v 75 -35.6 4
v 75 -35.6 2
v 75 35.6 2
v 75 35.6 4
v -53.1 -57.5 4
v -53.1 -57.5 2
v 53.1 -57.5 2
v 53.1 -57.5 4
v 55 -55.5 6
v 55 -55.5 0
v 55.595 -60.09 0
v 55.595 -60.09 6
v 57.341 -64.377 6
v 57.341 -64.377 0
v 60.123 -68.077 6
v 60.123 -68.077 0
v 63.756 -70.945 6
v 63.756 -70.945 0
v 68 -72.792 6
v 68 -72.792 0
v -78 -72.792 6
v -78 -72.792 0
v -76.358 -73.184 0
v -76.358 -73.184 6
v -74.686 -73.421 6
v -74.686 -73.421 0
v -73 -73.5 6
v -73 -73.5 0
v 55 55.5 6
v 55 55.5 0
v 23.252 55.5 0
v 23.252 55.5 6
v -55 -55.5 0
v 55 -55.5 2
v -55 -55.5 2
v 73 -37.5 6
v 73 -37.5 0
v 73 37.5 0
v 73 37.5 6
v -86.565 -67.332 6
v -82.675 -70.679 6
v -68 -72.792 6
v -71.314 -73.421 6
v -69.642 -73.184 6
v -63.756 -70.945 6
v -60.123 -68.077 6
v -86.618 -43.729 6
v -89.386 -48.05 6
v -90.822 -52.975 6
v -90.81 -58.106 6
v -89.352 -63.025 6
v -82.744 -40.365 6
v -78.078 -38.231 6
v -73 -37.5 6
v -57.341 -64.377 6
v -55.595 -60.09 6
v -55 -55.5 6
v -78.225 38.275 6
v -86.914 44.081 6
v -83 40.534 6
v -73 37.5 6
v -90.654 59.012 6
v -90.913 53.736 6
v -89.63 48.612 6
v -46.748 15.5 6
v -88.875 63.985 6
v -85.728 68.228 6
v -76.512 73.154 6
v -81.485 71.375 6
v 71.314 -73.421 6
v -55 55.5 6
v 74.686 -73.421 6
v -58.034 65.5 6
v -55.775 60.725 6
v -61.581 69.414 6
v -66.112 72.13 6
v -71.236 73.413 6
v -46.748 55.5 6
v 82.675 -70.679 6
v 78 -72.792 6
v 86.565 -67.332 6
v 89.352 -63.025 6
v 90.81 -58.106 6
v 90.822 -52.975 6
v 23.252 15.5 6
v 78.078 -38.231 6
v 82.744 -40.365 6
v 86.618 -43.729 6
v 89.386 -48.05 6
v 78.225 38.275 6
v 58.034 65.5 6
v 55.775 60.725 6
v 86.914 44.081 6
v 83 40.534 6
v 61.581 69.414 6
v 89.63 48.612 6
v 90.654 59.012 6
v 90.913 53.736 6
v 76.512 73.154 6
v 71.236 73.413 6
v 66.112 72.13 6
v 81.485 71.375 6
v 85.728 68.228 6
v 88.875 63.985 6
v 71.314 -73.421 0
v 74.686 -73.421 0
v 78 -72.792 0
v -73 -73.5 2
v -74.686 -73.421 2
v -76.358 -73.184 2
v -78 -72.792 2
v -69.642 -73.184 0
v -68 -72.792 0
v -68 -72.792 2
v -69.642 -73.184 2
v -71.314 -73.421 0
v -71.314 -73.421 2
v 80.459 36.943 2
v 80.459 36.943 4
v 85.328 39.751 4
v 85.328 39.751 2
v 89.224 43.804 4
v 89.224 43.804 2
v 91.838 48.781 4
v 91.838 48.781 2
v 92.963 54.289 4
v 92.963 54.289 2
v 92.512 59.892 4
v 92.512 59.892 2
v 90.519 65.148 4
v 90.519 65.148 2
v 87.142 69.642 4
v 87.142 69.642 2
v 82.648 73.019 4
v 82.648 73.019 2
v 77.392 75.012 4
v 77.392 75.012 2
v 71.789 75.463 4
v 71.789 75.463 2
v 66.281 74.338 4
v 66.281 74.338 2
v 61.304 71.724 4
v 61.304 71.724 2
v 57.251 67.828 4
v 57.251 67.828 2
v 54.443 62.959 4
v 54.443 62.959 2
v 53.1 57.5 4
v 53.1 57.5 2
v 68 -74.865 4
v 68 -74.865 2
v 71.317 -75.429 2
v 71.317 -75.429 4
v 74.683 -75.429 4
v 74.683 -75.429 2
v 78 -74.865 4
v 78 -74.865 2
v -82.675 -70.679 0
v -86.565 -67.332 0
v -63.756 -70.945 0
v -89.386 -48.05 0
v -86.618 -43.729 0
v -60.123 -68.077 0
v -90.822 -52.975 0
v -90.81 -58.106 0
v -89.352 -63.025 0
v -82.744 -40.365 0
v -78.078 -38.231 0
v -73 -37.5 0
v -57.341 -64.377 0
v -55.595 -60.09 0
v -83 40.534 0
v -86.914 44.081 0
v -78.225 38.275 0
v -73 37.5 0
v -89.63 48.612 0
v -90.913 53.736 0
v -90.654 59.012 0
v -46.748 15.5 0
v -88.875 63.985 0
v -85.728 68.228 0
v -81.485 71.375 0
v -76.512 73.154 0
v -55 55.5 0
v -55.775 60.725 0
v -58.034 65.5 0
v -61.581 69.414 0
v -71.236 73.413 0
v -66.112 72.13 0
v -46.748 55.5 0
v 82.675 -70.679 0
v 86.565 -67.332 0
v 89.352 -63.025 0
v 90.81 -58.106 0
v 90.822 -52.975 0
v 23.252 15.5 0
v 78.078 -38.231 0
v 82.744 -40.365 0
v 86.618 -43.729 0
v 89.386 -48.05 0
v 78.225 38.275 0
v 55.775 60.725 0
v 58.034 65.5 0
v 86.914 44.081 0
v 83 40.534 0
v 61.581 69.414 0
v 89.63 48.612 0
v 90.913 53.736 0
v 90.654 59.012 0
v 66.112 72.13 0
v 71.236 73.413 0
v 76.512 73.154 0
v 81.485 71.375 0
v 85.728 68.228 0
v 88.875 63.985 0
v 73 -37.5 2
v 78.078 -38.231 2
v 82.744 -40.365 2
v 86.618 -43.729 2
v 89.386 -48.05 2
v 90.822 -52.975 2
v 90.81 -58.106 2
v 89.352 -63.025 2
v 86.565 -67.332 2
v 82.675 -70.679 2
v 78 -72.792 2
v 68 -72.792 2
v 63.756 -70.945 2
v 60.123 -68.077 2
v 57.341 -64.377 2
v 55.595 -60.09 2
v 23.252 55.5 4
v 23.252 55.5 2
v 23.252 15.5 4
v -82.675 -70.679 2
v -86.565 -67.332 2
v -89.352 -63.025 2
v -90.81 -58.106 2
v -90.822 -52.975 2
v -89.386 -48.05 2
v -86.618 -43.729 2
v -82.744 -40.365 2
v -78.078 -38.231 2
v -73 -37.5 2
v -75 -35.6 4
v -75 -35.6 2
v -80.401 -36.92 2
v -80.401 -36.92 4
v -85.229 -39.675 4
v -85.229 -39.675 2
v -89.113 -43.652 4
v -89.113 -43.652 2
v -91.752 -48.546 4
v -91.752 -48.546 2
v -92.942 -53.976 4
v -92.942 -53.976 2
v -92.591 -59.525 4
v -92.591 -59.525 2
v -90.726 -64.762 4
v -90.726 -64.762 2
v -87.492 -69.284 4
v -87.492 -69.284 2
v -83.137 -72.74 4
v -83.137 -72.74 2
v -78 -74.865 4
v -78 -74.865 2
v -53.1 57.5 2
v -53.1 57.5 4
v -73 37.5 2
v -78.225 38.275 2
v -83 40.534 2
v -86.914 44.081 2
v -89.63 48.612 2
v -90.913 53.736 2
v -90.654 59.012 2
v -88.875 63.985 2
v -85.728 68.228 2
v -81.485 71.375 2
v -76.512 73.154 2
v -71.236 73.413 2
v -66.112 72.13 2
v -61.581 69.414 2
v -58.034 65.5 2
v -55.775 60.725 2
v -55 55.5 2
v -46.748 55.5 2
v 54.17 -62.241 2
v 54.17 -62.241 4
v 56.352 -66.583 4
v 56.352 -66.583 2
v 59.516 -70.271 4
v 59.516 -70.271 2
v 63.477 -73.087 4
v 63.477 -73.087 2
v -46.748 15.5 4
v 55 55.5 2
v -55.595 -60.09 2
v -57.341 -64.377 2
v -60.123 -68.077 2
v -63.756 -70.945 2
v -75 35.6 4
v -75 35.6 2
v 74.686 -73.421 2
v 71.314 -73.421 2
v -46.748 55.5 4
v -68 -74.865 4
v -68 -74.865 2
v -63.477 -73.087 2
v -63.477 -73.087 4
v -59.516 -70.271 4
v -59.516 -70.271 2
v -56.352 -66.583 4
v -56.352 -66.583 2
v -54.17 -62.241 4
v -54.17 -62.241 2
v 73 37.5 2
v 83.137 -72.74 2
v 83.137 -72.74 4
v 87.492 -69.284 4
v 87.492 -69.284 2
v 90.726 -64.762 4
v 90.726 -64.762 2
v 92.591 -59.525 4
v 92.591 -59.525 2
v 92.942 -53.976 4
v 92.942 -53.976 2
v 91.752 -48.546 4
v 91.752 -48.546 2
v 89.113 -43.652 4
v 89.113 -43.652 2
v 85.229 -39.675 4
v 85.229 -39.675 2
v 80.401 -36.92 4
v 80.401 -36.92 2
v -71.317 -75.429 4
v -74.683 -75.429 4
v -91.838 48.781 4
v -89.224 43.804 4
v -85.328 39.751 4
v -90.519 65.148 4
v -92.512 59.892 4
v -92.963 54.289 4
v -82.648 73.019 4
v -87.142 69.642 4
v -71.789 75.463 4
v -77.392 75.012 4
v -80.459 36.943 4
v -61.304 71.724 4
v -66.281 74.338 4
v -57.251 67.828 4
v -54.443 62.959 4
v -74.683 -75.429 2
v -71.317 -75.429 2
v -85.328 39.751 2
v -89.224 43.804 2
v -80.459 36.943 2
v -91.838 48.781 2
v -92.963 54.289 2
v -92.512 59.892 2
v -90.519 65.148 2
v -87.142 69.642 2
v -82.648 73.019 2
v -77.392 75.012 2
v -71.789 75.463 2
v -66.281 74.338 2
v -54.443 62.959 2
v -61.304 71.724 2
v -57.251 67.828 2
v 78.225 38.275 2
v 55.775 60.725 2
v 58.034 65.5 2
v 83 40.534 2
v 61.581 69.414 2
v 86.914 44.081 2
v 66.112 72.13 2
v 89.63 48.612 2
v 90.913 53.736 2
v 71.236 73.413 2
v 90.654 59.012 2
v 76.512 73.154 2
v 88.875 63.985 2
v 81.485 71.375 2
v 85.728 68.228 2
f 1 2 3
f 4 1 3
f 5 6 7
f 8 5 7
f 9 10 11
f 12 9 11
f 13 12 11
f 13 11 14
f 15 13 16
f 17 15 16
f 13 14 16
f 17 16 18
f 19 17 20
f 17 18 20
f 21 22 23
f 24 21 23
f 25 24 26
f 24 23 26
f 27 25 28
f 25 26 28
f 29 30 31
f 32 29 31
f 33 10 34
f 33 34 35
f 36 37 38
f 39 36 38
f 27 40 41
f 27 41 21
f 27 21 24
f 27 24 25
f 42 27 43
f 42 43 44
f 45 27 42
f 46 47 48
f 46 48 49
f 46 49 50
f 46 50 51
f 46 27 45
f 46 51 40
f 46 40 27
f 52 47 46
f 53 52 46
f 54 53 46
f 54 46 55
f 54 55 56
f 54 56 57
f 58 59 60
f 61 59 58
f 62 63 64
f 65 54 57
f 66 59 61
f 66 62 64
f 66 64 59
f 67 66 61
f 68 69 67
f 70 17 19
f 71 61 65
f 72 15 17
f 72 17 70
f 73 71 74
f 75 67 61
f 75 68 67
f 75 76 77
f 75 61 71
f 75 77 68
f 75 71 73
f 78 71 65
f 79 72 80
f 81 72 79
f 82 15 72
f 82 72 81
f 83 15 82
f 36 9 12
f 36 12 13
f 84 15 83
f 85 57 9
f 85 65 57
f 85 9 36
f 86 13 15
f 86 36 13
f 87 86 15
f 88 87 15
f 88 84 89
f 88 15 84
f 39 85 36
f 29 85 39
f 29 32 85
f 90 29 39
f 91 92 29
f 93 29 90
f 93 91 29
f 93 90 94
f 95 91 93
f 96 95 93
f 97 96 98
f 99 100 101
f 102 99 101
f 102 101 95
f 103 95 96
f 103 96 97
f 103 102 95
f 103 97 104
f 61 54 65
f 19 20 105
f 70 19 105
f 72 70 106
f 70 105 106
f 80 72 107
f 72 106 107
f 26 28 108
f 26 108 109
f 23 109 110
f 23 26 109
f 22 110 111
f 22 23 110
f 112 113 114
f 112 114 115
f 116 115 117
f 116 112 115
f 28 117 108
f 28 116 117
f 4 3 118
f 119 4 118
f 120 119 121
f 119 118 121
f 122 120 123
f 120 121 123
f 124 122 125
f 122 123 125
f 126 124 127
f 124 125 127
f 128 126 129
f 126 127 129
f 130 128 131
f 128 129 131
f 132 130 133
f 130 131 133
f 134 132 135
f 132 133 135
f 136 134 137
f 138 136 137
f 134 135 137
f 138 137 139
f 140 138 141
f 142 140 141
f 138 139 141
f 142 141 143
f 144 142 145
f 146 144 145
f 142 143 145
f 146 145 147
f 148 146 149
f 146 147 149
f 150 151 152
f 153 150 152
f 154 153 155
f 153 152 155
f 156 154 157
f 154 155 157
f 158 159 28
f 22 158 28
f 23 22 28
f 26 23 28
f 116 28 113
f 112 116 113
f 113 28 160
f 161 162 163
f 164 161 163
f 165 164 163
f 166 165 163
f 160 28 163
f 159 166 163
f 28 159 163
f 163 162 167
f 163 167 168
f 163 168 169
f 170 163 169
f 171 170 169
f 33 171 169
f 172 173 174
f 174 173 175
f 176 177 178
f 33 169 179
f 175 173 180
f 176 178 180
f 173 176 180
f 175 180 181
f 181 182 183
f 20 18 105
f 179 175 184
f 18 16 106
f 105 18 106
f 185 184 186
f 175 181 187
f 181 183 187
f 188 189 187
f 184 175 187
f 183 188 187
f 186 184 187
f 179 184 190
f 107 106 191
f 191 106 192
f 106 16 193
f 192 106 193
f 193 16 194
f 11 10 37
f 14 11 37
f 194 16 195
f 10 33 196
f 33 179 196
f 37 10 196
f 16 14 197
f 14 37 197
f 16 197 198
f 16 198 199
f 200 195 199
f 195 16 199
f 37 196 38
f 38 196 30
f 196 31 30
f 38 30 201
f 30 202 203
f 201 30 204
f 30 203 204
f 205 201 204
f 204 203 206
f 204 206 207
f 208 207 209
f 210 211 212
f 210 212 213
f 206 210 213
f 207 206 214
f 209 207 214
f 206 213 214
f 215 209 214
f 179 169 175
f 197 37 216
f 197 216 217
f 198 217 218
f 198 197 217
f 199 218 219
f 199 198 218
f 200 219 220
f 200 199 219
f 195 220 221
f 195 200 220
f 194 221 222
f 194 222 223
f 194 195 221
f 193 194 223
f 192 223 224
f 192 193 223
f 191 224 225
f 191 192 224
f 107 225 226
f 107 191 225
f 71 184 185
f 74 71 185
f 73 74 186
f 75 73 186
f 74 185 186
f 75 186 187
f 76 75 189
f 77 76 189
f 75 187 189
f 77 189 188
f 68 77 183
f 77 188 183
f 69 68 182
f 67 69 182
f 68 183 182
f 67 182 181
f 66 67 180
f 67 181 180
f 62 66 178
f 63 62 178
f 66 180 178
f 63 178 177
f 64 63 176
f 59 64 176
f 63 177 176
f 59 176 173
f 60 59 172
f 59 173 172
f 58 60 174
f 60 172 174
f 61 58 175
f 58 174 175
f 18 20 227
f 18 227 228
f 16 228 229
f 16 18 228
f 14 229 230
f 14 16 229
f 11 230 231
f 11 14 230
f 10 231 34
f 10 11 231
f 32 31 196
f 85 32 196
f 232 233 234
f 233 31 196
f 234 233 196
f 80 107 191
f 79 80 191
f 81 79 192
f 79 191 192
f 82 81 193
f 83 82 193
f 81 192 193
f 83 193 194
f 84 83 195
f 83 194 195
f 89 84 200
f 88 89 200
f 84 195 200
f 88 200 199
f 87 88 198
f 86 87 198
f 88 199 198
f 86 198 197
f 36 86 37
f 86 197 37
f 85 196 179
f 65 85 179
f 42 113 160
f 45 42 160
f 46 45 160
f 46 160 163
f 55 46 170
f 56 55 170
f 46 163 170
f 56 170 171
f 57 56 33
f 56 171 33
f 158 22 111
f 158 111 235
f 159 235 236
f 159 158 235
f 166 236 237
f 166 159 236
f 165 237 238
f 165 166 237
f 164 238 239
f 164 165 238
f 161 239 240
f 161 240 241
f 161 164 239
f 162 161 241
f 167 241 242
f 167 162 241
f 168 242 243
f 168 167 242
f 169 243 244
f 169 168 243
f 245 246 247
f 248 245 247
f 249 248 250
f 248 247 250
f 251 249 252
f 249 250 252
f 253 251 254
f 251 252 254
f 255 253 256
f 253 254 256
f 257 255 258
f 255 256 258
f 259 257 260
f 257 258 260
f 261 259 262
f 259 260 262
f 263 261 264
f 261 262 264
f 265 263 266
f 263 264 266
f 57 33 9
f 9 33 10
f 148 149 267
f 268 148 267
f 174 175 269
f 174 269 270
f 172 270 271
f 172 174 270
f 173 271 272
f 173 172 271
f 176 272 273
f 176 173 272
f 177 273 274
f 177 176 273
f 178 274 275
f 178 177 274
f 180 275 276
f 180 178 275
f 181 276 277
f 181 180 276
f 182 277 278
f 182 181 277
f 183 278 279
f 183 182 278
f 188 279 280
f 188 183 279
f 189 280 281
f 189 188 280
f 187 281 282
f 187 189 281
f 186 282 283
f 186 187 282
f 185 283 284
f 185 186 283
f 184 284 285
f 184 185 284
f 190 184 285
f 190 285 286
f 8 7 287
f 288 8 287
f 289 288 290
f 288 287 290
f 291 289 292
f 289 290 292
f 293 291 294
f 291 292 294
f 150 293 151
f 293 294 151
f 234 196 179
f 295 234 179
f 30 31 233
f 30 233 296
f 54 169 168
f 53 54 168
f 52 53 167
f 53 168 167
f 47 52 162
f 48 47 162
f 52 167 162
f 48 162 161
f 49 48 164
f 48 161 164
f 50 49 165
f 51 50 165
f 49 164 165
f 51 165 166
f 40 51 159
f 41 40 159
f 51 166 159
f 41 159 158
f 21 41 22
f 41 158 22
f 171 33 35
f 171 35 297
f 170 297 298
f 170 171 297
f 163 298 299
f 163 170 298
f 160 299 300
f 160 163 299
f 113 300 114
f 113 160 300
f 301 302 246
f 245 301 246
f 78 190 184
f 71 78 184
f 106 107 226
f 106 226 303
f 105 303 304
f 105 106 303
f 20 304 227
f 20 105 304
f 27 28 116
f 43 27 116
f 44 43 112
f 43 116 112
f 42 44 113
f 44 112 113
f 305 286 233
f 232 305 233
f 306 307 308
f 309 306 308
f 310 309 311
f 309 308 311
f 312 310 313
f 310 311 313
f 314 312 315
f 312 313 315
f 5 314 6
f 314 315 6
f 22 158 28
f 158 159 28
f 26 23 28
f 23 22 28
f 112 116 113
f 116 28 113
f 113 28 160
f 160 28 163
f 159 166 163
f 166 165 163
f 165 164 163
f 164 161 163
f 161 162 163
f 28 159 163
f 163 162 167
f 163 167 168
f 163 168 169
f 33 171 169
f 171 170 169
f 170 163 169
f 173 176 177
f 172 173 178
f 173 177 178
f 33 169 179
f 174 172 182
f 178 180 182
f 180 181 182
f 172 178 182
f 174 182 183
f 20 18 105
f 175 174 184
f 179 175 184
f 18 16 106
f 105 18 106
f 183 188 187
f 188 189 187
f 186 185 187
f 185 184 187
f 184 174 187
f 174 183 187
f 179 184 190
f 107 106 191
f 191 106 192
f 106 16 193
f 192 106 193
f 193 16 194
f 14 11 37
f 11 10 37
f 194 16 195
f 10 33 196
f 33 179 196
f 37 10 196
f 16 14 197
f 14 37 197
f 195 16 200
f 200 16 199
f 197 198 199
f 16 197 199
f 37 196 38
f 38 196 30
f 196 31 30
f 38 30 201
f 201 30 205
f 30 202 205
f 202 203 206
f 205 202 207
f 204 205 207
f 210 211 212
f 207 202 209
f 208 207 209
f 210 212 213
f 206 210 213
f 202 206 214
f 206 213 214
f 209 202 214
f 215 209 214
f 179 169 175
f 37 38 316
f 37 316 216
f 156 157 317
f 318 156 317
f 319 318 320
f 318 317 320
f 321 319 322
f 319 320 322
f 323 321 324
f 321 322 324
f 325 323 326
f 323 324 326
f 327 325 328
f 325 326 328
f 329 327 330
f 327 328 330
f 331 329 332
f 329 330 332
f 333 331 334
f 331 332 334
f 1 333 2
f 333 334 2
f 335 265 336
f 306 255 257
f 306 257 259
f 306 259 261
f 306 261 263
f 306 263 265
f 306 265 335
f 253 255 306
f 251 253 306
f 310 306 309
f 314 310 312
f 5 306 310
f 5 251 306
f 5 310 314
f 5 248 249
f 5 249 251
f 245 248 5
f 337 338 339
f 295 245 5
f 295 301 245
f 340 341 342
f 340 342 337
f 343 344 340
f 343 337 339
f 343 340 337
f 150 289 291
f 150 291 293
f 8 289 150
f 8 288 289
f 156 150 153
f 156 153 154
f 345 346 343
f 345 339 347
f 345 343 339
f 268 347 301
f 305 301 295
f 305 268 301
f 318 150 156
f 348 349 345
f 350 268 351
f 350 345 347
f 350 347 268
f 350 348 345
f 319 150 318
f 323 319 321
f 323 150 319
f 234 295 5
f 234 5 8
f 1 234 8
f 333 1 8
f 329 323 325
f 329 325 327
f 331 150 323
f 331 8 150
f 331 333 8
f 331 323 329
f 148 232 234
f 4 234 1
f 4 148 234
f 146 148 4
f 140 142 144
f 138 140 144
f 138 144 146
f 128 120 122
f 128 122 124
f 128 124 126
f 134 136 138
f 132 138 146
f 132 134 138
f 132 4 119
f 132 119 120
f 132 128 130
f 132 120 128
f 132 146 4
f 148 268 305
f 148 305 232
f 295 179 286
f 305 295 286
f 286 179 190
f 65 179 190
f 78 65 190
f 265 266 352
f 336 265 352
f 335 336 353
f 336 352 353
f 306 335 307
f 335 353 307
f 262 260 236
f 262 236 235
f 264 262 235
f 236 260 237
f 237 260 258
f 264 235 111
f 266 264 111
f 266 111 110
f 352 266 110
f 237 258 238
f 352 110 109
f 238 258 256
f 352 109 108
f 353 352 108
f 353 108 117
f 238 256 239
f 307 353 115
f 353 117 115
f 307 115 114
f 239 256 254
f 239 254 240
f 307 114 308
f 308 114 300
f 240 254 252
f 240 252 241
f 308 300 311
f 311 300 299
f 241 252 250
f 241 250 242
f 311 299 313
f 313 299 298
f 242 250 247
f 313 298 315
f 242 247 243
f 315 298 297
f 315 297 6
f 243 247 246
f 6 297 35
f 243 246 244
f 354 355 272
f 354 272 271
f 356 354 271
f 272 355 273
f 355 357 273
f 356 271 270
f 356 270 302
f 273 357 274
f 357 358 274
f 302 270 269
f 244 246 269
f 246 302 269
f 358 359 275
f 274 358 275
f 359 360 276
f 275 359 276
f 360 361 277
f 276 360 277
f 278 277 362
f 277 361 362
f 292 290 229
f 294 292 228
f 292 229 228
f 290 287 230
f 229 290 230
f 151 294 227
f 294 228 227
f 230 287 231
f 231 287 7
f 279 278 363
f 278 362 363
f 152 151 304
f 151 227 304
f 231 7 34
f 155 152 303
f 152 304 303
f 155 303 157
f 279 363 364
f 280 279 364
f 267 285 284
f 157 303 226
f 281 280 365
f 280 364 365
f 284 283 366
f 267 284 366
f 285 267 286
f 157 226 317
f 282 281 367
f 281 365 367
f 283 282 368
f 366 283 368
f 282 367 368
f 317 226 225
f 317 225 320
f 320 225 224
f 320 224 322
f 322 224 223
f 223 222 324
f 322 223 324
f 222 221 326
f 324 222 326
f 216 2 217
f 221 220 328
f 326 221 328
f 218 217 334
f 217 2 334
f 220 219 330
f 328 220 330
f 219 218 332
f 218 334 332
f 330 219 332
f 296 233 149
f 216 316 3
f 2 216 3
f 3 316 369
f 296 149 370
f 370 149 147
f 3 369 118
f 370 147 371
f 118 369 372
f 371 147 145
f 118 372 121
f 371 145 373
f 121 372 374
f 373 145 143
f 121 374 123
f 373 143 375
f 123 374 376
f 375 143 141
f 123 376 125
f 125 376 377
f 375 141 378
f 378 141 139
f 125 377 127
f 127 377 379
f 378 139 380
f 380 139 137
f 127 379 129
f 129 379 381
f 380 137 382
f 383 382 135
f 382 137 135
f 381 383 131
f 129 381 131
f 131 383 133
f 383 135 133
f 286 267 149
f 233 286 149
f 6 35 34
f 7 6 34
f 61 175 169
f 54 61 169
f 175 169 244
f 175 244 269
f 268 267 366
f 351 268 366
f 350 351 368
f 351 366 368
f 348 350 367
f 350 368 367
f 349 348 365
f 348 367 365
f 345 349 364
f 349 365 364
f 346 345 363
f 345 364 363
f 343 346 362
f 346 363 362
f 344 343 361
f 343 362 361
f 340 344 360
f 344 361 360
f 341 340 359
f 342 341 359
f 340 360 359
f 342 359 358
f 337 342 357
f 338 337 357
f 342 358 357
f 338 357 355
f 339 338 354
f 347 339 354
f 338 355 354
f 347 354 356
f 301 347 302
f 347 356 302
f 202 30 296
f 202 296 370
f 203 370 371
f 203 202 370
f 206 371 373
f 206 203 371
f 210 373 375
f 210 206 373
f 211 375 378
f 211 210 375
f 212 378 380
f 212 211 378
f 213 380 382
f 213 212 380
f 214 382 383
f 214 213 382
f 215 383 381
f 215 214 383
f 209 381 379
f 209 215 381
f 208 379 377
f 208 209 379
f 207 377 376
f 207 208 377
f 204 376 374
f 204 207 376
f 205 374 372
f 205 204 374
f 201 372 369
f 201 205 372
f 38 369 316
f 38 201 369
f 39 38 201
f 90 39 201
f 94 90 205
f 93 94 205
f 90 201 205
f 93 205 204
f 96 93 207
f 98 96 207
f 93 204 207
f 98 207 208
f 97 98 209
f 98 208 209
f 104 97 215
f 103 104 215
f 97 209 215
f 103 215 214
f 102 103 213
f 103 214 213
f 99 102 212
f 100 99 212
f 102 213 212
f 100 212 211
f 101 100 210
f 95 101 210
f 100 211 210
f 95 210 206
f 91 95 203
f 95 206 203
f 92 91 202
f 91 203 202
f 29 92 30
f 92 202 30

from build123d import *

# Parameters (mm, degrees)
F0_W     = 50
F0_H     = 2
F1_DEPTH = 4
F2_DEPTH = 2
F3_DEPTH = 6
F0_W_2   = 70
F0_H_2   = 40
F4_DEPTH = 6


with BuildPart() as f1:
    # F0 (on Top) → F1 (new body)
    with BuildSketch(Plane.XY):
        with BuildLine():
            Line((53.1002512579, 57.5), (-53.1002512579, 57.5))
            ThreePointArc((-53.1002512579, 57.5), (-87.1421356237, 69.6421356237), (-75, 35.6002512579))
            Line((-75, 35.6002512579), (-75, -35.6002512579))
            ThreePointArc((-75, -35.6002512579), (-92.9418777621, -53.9763493445), (-78, -74.864916731))
            Line((-78, -74.864916731), (-78, -72.7916164658))
            ThreePointArc((-78, -72.7916164658), (-90.8220242451, -52.9750342957), (-73, -37.5))
            Line((-73, -37.5), (-73, 37.5))
            ThreePointArc((-73, 37.5), (-85.7279220614, 68.2279220614), (-55, 55.5))
            Line((-55, 55.5), (-46.7476695776, 55.5))
            Line((-46.7476695776, 55.5), (23.2523304224, 55.5))
            Line((23.2523304224, 55.5), (55, 55.5))
            ThreePointArc((55, 55.5), (85.7279220614, 68.2279220614), (73, 37.5))
            Line((73, 37.5), (73, -37.5))
            ThreePointArc((73, -37.5), (90.8220242451, -52.9750342957), (78, -72.7916164658))
            Line((78, -72.7916164658), (78, -74.864916731))
            ThreePointArc((78, -74.864916731), (92.9418777621, -53.9763493445), (75, -35.6002512579))
            Line((75, -35.6002512579), (75, 35.6002512579))
            ThreePointArc((75, 35.6002512579), (87.1421356237, 69.6421356237), (53.1002512579, 57.5))
        make_face()
        with BuildLine():
            Line((-78, -72.7916164658), (-78, -74.864916731))
            ThreePointArc((-78, -74.864916731), (-73, -75.5), (-68, -74.864916731))
            Line((-68, -74.864916731), (-68, -72.7916164658))
            ThreePointArc((-68, -72.7916164658), (-70.4750342957, -73.3220242451), (-73, -73.5))
            ThreePointArc((-73, -73.5), (-75.5249657043, -73.3220242451), (-78, -72.7916164658))
        make_face()
        with BuildLine():
            ThreePointArc((68, -74.864916731), (73, -75.5), (78, -74.864916731))
            Line((78, -74.864916731), (78, -72.7916164658))
            ThreePointArc((78, -72.7916164658), (73, -73.5), (68, -72.7916164658))
            Line((68, -72.7916164658), (68, -74.864916731))
        make_face()
        with BuildLine():
            Line((-68, -72.7916164658), (-68, -74.864916731))
            ThreePointArc((-68, -74.864916731), (-57.8215792941, -68.5236532845), (-53.1002512579, -57.5))
            Line((-53.1002512579, -57.5), (-25, -57.5))
            Line((-25, -57.5), (-25, -55.5))
            Line((-25, -55.5), (-55, -55.5))
            ThreePointArc((-55, -55.5), (-58.6125054301, -66.3166538264), (-68, -72.7916164658))
        make_face()
        with BuildLine():
            ThreePointArc((53.1002512579, -57.5), (57.8215792941, -68.5236532845), (68, -74.864916731))
            Line((68, -74.864916731), (68, -72.7916164658))
            ThreePointArc((68, -72.7916164658), (58.6125054301, -66.3166538264), (55, -55.5))
            Line((55, -55.5), (25, -55.5))
            Line((25, -55.5), (25, -57.5))
            Line((25, -57.5), (53.1002512579, -57.5))
        make_face()
        with Locations((0, -56.5)):
            Rectangle(F0_W, F0_H)
        with BuildLine():
            ThreePointArc((-73, -37.5), (-90.8220242451, -52.9750342957), (-78, -72.7916164658))
            ThreePointArc((-78, -72.7916164658), (-75.5249657043, -73.3220242451), (-73, -73.5))
            ThreePointArc((-73, -73.5), (-70.4750342957, -73.3220242451), (-68, -72.7916164658))
            ThreePointArc((-68, -72.7916164658), (-58.6125054301, -66.3166538264), (-55, -55.5))
            Line((-55, -55.5), (-25, -55.5))
            Line((-25, -55.5), (25, -55.5))
            Line((25, -55.5), (55, -55.5))
            ThreePointArc((55, -55.5), (58.6125054301, -66.3166538264), (68, -72.7916164658))
            ThreePointArc((68, -72.7916164658), (73, -73.5), (78, -72.7916164658))
            ThreePointArc((78, -72.7916164658), (90.8220242451, -52.9750342957), (73, -37.5))
            Line((73, -37.5), (73, 37.5))
            ThreePointArc((73, 37.5), (85.7279220614, 68.2279220614), (55, 55.5))
            Line((55, 55.5), (23.2523304224, 55.5))
            Line((23.2523304224, 55.5), (23.2523304224, 15.5))
            Line((23.2523304224, 15.5), (-46.7476695776, 15.5))
            Line((-46.7476695776, 15.5), (-46.7476695776, 55.5))
            Line((-46.7476695776, 55.5), (-55, 55.5))
            ThreePointArc((-55, 55.5), (-85.7279220614, 68.2279220614), (-73, 37.5))
            Line((-73, 37.5), (-73, -37.5))
        make_face()
    extrude(amount=F1_DEPTH)

    # F0 (on Top) → F2 (cut)
    with BuildSketch(Plane.XY):
        with BuildLine():
            Line((-68, -72.7916164658), (-68, -74.864916731))
            ThreePointArc((-68, -74.864916731), (-57.8215792941, -68.5236532845), (-53.1002512579, -57.5))
            Line((-53.1002512579, -57.5), (-25, -57.5))
            Line((-25, -57.5), (-25, -55.5))
            Line((-25, -55.5), (-55, -55.5))
            ThreePointArc((-55, -55.5), (-58.6125054301, -66.3166538264), (-68, -72.7916164658))
        make_face()
        with BuildLine():
            Line((-78, -72.7916164658), (-78, -74.864916731))
            ThreePointArc((-78, -74.864916731), (-73, -75.5), (-68, -74.864916731))
            Line((-68, -74.864916731), (-68, -72.7916164658))
            ThreePointArc((-68, -72.7916164658), (-70.4750342957, -73.3220242451), (-73, -73.5))
            ThreePointArc((-73, -73.5), (-75.5249657043, -73.3220242451), (-78, -72.7916164658))
        make_face()
        with BuildLine():
            Line((53.1002512579, 57.5), (-53.1002512579, 57.5))
            ThreePointArc((-53.1002512579, 57.5), (-87.1421356237, 69.6421356237), (-75, 35.6002512579))
            Line((-75, 35.6002512579), (-75, -35.6002512579))
            ThreePointArc((-75, -35.6002512579), (-92.9418777621, -53.9763493445), (-78, -74.864916731))
            Line((-78, -74.864916731), (-78, -72.7916164658))
            ThreePointArc((-78, -72.7916164658), (-90.8220242451, -52.9750342957), (-73, -37.5))
            Line((-73, -37.5), (-73, 37.5))
            ThreePointArc((-73, 37.5), (-85.7279220614, 68.2279220614), (-55, 55.5))
            Line((-55, 55.5), (-46.7476695776, 55.5))
            Line((-46.7476695776, 55.5), (23.2523304224, 55.5))
            Line((23.2523304224, 55.5), (55, 55.5))
            ThreePointArc((55, 55.5), (85.7279220614, 68.2279220614), (73, 37.5))
            Line((73, 37.5), (73, -37.5))
            ThreePointArc((73, -37.5), (90.8220242451, -52.9750342957), (78, -72.7916164658))
            Line((78, -72.7916164658), (78, -74.864916731))
            ThreePointArc((78, -74.864916731), (92.9418777621, -53.9763493445), (75, -35.6002512579))
            Line((75, -35.6002512579), (75, 35.6002512579))
            ThreePointArc((75, 35.6002512579), (87.1421356237, 69.6421356237), (53.1002512579, 57.5))
        make_face()
        with Locations((0, -56.5)):
            Rectangle(F0_W, F0_H)
        with BuildLine():
            ThreePointArc((53.1002512579, -57.5), (57.8215792941, -68.5236532845), (68, -74.864916731))
            Line((68, -74.864916731), (68, -72.7916164658))
            ThreePointArc((68, -72.7916164658), (58.6125054301, -66.3166538264), (55, -55.5))
            Line((55, -55.5), (25, -55.5))
            Line((25, -55.5), (25, -57.5))
            Line((25, -57.5), (53.1002512579, -57.5))
        make_face()
        with BuildLine():
            ThreePointArc((68, -74.864916731), (73, -75.5), (78, -74.864916731))
            Line((78, -74.864916731), (78, -72.7916164658))
            ThreePointArc((78, -72.7916164658), (73, -73.5), (68, -72.7916164658))
            Line((68, -72.7916164658), (68, -74.864916731))
        make_face()
    extrude(amount=F2_DEPTH, mode=Mode.SUBTRACT)

    # F0 (on Top) → F4 (cut)
    with BuildSketch(Plane.XY):
        with Locations((-11.7476695776, 35.5)):
            Rectangle(F0_W_2, F0_H_2)
    extrude(amount=F4_DEPTH, mode=Mode.SUBTRACT)


with BuildPart() as f3:
    # F0 (on Top) → F3 (new body)
    with BuildSketch(Plane.XY):
        with BuildLine():
            ThreePointArc((-73, -37.5), (-90.8220242451, -52.9750342957), (-78, -72.7916164658))
            ThreePointArc((-78, -72.7916164658), (-75.5249657043, -73.3220242451), (-73, -73.5))
            ThreePointArc((-73, -73.5), (-70.4750342957, -73.3220242451), (-68, -72.7916164658))
            ThreePointArc((-68, -72.7916164658), (-58.6125054301, -66.3166538264), (-55, -55.5))
            Line((-55, -55.5), (-25, -55.5))
            Line((-25, -55.5), (25, -55.5))
            Line((25, -55.5), (55, -55.5))
            ThreePointArc((55, -55.5), (58.6125054301, -66.3166538264), (68, -72.7916164658))
            ThreePointArc((68, -72.7916164658), (73, -73.5), (78, -72.7916164658))
            ThreePointArc((78, -72.7916164658), (90.8220242451, -52.9750342957), (73, -37.5))
            Line((73, -37.5), (73, 37.5))
            ThreePointArc((73, 37.5), (85.7279220614, 68.2279220614), (55, 55.5))
            Line((55, 55.5), (23.2523304224, 55.5))
            Line((23.2523304224, 55.5), (23.2523304224, 15.5))
            Line((23.2523304224, 15.5), (-46.7476695776, 15.5))
            Line((-46.7476695776, 15.5), (-46.7476695776, 55.5))
            Line((-46.7476695776, 55.5), (-55, 55.5))
            ThreePointArc((-55, 55.5), (-85.7279220614, 68.2279220614), (-73, 37.5))
            Line((-73, 37.5), (-73, -37.5))
        make_face()
    extrude(amount=F3_DEPTH)


solid = Compound([f1.part, f3.part])
